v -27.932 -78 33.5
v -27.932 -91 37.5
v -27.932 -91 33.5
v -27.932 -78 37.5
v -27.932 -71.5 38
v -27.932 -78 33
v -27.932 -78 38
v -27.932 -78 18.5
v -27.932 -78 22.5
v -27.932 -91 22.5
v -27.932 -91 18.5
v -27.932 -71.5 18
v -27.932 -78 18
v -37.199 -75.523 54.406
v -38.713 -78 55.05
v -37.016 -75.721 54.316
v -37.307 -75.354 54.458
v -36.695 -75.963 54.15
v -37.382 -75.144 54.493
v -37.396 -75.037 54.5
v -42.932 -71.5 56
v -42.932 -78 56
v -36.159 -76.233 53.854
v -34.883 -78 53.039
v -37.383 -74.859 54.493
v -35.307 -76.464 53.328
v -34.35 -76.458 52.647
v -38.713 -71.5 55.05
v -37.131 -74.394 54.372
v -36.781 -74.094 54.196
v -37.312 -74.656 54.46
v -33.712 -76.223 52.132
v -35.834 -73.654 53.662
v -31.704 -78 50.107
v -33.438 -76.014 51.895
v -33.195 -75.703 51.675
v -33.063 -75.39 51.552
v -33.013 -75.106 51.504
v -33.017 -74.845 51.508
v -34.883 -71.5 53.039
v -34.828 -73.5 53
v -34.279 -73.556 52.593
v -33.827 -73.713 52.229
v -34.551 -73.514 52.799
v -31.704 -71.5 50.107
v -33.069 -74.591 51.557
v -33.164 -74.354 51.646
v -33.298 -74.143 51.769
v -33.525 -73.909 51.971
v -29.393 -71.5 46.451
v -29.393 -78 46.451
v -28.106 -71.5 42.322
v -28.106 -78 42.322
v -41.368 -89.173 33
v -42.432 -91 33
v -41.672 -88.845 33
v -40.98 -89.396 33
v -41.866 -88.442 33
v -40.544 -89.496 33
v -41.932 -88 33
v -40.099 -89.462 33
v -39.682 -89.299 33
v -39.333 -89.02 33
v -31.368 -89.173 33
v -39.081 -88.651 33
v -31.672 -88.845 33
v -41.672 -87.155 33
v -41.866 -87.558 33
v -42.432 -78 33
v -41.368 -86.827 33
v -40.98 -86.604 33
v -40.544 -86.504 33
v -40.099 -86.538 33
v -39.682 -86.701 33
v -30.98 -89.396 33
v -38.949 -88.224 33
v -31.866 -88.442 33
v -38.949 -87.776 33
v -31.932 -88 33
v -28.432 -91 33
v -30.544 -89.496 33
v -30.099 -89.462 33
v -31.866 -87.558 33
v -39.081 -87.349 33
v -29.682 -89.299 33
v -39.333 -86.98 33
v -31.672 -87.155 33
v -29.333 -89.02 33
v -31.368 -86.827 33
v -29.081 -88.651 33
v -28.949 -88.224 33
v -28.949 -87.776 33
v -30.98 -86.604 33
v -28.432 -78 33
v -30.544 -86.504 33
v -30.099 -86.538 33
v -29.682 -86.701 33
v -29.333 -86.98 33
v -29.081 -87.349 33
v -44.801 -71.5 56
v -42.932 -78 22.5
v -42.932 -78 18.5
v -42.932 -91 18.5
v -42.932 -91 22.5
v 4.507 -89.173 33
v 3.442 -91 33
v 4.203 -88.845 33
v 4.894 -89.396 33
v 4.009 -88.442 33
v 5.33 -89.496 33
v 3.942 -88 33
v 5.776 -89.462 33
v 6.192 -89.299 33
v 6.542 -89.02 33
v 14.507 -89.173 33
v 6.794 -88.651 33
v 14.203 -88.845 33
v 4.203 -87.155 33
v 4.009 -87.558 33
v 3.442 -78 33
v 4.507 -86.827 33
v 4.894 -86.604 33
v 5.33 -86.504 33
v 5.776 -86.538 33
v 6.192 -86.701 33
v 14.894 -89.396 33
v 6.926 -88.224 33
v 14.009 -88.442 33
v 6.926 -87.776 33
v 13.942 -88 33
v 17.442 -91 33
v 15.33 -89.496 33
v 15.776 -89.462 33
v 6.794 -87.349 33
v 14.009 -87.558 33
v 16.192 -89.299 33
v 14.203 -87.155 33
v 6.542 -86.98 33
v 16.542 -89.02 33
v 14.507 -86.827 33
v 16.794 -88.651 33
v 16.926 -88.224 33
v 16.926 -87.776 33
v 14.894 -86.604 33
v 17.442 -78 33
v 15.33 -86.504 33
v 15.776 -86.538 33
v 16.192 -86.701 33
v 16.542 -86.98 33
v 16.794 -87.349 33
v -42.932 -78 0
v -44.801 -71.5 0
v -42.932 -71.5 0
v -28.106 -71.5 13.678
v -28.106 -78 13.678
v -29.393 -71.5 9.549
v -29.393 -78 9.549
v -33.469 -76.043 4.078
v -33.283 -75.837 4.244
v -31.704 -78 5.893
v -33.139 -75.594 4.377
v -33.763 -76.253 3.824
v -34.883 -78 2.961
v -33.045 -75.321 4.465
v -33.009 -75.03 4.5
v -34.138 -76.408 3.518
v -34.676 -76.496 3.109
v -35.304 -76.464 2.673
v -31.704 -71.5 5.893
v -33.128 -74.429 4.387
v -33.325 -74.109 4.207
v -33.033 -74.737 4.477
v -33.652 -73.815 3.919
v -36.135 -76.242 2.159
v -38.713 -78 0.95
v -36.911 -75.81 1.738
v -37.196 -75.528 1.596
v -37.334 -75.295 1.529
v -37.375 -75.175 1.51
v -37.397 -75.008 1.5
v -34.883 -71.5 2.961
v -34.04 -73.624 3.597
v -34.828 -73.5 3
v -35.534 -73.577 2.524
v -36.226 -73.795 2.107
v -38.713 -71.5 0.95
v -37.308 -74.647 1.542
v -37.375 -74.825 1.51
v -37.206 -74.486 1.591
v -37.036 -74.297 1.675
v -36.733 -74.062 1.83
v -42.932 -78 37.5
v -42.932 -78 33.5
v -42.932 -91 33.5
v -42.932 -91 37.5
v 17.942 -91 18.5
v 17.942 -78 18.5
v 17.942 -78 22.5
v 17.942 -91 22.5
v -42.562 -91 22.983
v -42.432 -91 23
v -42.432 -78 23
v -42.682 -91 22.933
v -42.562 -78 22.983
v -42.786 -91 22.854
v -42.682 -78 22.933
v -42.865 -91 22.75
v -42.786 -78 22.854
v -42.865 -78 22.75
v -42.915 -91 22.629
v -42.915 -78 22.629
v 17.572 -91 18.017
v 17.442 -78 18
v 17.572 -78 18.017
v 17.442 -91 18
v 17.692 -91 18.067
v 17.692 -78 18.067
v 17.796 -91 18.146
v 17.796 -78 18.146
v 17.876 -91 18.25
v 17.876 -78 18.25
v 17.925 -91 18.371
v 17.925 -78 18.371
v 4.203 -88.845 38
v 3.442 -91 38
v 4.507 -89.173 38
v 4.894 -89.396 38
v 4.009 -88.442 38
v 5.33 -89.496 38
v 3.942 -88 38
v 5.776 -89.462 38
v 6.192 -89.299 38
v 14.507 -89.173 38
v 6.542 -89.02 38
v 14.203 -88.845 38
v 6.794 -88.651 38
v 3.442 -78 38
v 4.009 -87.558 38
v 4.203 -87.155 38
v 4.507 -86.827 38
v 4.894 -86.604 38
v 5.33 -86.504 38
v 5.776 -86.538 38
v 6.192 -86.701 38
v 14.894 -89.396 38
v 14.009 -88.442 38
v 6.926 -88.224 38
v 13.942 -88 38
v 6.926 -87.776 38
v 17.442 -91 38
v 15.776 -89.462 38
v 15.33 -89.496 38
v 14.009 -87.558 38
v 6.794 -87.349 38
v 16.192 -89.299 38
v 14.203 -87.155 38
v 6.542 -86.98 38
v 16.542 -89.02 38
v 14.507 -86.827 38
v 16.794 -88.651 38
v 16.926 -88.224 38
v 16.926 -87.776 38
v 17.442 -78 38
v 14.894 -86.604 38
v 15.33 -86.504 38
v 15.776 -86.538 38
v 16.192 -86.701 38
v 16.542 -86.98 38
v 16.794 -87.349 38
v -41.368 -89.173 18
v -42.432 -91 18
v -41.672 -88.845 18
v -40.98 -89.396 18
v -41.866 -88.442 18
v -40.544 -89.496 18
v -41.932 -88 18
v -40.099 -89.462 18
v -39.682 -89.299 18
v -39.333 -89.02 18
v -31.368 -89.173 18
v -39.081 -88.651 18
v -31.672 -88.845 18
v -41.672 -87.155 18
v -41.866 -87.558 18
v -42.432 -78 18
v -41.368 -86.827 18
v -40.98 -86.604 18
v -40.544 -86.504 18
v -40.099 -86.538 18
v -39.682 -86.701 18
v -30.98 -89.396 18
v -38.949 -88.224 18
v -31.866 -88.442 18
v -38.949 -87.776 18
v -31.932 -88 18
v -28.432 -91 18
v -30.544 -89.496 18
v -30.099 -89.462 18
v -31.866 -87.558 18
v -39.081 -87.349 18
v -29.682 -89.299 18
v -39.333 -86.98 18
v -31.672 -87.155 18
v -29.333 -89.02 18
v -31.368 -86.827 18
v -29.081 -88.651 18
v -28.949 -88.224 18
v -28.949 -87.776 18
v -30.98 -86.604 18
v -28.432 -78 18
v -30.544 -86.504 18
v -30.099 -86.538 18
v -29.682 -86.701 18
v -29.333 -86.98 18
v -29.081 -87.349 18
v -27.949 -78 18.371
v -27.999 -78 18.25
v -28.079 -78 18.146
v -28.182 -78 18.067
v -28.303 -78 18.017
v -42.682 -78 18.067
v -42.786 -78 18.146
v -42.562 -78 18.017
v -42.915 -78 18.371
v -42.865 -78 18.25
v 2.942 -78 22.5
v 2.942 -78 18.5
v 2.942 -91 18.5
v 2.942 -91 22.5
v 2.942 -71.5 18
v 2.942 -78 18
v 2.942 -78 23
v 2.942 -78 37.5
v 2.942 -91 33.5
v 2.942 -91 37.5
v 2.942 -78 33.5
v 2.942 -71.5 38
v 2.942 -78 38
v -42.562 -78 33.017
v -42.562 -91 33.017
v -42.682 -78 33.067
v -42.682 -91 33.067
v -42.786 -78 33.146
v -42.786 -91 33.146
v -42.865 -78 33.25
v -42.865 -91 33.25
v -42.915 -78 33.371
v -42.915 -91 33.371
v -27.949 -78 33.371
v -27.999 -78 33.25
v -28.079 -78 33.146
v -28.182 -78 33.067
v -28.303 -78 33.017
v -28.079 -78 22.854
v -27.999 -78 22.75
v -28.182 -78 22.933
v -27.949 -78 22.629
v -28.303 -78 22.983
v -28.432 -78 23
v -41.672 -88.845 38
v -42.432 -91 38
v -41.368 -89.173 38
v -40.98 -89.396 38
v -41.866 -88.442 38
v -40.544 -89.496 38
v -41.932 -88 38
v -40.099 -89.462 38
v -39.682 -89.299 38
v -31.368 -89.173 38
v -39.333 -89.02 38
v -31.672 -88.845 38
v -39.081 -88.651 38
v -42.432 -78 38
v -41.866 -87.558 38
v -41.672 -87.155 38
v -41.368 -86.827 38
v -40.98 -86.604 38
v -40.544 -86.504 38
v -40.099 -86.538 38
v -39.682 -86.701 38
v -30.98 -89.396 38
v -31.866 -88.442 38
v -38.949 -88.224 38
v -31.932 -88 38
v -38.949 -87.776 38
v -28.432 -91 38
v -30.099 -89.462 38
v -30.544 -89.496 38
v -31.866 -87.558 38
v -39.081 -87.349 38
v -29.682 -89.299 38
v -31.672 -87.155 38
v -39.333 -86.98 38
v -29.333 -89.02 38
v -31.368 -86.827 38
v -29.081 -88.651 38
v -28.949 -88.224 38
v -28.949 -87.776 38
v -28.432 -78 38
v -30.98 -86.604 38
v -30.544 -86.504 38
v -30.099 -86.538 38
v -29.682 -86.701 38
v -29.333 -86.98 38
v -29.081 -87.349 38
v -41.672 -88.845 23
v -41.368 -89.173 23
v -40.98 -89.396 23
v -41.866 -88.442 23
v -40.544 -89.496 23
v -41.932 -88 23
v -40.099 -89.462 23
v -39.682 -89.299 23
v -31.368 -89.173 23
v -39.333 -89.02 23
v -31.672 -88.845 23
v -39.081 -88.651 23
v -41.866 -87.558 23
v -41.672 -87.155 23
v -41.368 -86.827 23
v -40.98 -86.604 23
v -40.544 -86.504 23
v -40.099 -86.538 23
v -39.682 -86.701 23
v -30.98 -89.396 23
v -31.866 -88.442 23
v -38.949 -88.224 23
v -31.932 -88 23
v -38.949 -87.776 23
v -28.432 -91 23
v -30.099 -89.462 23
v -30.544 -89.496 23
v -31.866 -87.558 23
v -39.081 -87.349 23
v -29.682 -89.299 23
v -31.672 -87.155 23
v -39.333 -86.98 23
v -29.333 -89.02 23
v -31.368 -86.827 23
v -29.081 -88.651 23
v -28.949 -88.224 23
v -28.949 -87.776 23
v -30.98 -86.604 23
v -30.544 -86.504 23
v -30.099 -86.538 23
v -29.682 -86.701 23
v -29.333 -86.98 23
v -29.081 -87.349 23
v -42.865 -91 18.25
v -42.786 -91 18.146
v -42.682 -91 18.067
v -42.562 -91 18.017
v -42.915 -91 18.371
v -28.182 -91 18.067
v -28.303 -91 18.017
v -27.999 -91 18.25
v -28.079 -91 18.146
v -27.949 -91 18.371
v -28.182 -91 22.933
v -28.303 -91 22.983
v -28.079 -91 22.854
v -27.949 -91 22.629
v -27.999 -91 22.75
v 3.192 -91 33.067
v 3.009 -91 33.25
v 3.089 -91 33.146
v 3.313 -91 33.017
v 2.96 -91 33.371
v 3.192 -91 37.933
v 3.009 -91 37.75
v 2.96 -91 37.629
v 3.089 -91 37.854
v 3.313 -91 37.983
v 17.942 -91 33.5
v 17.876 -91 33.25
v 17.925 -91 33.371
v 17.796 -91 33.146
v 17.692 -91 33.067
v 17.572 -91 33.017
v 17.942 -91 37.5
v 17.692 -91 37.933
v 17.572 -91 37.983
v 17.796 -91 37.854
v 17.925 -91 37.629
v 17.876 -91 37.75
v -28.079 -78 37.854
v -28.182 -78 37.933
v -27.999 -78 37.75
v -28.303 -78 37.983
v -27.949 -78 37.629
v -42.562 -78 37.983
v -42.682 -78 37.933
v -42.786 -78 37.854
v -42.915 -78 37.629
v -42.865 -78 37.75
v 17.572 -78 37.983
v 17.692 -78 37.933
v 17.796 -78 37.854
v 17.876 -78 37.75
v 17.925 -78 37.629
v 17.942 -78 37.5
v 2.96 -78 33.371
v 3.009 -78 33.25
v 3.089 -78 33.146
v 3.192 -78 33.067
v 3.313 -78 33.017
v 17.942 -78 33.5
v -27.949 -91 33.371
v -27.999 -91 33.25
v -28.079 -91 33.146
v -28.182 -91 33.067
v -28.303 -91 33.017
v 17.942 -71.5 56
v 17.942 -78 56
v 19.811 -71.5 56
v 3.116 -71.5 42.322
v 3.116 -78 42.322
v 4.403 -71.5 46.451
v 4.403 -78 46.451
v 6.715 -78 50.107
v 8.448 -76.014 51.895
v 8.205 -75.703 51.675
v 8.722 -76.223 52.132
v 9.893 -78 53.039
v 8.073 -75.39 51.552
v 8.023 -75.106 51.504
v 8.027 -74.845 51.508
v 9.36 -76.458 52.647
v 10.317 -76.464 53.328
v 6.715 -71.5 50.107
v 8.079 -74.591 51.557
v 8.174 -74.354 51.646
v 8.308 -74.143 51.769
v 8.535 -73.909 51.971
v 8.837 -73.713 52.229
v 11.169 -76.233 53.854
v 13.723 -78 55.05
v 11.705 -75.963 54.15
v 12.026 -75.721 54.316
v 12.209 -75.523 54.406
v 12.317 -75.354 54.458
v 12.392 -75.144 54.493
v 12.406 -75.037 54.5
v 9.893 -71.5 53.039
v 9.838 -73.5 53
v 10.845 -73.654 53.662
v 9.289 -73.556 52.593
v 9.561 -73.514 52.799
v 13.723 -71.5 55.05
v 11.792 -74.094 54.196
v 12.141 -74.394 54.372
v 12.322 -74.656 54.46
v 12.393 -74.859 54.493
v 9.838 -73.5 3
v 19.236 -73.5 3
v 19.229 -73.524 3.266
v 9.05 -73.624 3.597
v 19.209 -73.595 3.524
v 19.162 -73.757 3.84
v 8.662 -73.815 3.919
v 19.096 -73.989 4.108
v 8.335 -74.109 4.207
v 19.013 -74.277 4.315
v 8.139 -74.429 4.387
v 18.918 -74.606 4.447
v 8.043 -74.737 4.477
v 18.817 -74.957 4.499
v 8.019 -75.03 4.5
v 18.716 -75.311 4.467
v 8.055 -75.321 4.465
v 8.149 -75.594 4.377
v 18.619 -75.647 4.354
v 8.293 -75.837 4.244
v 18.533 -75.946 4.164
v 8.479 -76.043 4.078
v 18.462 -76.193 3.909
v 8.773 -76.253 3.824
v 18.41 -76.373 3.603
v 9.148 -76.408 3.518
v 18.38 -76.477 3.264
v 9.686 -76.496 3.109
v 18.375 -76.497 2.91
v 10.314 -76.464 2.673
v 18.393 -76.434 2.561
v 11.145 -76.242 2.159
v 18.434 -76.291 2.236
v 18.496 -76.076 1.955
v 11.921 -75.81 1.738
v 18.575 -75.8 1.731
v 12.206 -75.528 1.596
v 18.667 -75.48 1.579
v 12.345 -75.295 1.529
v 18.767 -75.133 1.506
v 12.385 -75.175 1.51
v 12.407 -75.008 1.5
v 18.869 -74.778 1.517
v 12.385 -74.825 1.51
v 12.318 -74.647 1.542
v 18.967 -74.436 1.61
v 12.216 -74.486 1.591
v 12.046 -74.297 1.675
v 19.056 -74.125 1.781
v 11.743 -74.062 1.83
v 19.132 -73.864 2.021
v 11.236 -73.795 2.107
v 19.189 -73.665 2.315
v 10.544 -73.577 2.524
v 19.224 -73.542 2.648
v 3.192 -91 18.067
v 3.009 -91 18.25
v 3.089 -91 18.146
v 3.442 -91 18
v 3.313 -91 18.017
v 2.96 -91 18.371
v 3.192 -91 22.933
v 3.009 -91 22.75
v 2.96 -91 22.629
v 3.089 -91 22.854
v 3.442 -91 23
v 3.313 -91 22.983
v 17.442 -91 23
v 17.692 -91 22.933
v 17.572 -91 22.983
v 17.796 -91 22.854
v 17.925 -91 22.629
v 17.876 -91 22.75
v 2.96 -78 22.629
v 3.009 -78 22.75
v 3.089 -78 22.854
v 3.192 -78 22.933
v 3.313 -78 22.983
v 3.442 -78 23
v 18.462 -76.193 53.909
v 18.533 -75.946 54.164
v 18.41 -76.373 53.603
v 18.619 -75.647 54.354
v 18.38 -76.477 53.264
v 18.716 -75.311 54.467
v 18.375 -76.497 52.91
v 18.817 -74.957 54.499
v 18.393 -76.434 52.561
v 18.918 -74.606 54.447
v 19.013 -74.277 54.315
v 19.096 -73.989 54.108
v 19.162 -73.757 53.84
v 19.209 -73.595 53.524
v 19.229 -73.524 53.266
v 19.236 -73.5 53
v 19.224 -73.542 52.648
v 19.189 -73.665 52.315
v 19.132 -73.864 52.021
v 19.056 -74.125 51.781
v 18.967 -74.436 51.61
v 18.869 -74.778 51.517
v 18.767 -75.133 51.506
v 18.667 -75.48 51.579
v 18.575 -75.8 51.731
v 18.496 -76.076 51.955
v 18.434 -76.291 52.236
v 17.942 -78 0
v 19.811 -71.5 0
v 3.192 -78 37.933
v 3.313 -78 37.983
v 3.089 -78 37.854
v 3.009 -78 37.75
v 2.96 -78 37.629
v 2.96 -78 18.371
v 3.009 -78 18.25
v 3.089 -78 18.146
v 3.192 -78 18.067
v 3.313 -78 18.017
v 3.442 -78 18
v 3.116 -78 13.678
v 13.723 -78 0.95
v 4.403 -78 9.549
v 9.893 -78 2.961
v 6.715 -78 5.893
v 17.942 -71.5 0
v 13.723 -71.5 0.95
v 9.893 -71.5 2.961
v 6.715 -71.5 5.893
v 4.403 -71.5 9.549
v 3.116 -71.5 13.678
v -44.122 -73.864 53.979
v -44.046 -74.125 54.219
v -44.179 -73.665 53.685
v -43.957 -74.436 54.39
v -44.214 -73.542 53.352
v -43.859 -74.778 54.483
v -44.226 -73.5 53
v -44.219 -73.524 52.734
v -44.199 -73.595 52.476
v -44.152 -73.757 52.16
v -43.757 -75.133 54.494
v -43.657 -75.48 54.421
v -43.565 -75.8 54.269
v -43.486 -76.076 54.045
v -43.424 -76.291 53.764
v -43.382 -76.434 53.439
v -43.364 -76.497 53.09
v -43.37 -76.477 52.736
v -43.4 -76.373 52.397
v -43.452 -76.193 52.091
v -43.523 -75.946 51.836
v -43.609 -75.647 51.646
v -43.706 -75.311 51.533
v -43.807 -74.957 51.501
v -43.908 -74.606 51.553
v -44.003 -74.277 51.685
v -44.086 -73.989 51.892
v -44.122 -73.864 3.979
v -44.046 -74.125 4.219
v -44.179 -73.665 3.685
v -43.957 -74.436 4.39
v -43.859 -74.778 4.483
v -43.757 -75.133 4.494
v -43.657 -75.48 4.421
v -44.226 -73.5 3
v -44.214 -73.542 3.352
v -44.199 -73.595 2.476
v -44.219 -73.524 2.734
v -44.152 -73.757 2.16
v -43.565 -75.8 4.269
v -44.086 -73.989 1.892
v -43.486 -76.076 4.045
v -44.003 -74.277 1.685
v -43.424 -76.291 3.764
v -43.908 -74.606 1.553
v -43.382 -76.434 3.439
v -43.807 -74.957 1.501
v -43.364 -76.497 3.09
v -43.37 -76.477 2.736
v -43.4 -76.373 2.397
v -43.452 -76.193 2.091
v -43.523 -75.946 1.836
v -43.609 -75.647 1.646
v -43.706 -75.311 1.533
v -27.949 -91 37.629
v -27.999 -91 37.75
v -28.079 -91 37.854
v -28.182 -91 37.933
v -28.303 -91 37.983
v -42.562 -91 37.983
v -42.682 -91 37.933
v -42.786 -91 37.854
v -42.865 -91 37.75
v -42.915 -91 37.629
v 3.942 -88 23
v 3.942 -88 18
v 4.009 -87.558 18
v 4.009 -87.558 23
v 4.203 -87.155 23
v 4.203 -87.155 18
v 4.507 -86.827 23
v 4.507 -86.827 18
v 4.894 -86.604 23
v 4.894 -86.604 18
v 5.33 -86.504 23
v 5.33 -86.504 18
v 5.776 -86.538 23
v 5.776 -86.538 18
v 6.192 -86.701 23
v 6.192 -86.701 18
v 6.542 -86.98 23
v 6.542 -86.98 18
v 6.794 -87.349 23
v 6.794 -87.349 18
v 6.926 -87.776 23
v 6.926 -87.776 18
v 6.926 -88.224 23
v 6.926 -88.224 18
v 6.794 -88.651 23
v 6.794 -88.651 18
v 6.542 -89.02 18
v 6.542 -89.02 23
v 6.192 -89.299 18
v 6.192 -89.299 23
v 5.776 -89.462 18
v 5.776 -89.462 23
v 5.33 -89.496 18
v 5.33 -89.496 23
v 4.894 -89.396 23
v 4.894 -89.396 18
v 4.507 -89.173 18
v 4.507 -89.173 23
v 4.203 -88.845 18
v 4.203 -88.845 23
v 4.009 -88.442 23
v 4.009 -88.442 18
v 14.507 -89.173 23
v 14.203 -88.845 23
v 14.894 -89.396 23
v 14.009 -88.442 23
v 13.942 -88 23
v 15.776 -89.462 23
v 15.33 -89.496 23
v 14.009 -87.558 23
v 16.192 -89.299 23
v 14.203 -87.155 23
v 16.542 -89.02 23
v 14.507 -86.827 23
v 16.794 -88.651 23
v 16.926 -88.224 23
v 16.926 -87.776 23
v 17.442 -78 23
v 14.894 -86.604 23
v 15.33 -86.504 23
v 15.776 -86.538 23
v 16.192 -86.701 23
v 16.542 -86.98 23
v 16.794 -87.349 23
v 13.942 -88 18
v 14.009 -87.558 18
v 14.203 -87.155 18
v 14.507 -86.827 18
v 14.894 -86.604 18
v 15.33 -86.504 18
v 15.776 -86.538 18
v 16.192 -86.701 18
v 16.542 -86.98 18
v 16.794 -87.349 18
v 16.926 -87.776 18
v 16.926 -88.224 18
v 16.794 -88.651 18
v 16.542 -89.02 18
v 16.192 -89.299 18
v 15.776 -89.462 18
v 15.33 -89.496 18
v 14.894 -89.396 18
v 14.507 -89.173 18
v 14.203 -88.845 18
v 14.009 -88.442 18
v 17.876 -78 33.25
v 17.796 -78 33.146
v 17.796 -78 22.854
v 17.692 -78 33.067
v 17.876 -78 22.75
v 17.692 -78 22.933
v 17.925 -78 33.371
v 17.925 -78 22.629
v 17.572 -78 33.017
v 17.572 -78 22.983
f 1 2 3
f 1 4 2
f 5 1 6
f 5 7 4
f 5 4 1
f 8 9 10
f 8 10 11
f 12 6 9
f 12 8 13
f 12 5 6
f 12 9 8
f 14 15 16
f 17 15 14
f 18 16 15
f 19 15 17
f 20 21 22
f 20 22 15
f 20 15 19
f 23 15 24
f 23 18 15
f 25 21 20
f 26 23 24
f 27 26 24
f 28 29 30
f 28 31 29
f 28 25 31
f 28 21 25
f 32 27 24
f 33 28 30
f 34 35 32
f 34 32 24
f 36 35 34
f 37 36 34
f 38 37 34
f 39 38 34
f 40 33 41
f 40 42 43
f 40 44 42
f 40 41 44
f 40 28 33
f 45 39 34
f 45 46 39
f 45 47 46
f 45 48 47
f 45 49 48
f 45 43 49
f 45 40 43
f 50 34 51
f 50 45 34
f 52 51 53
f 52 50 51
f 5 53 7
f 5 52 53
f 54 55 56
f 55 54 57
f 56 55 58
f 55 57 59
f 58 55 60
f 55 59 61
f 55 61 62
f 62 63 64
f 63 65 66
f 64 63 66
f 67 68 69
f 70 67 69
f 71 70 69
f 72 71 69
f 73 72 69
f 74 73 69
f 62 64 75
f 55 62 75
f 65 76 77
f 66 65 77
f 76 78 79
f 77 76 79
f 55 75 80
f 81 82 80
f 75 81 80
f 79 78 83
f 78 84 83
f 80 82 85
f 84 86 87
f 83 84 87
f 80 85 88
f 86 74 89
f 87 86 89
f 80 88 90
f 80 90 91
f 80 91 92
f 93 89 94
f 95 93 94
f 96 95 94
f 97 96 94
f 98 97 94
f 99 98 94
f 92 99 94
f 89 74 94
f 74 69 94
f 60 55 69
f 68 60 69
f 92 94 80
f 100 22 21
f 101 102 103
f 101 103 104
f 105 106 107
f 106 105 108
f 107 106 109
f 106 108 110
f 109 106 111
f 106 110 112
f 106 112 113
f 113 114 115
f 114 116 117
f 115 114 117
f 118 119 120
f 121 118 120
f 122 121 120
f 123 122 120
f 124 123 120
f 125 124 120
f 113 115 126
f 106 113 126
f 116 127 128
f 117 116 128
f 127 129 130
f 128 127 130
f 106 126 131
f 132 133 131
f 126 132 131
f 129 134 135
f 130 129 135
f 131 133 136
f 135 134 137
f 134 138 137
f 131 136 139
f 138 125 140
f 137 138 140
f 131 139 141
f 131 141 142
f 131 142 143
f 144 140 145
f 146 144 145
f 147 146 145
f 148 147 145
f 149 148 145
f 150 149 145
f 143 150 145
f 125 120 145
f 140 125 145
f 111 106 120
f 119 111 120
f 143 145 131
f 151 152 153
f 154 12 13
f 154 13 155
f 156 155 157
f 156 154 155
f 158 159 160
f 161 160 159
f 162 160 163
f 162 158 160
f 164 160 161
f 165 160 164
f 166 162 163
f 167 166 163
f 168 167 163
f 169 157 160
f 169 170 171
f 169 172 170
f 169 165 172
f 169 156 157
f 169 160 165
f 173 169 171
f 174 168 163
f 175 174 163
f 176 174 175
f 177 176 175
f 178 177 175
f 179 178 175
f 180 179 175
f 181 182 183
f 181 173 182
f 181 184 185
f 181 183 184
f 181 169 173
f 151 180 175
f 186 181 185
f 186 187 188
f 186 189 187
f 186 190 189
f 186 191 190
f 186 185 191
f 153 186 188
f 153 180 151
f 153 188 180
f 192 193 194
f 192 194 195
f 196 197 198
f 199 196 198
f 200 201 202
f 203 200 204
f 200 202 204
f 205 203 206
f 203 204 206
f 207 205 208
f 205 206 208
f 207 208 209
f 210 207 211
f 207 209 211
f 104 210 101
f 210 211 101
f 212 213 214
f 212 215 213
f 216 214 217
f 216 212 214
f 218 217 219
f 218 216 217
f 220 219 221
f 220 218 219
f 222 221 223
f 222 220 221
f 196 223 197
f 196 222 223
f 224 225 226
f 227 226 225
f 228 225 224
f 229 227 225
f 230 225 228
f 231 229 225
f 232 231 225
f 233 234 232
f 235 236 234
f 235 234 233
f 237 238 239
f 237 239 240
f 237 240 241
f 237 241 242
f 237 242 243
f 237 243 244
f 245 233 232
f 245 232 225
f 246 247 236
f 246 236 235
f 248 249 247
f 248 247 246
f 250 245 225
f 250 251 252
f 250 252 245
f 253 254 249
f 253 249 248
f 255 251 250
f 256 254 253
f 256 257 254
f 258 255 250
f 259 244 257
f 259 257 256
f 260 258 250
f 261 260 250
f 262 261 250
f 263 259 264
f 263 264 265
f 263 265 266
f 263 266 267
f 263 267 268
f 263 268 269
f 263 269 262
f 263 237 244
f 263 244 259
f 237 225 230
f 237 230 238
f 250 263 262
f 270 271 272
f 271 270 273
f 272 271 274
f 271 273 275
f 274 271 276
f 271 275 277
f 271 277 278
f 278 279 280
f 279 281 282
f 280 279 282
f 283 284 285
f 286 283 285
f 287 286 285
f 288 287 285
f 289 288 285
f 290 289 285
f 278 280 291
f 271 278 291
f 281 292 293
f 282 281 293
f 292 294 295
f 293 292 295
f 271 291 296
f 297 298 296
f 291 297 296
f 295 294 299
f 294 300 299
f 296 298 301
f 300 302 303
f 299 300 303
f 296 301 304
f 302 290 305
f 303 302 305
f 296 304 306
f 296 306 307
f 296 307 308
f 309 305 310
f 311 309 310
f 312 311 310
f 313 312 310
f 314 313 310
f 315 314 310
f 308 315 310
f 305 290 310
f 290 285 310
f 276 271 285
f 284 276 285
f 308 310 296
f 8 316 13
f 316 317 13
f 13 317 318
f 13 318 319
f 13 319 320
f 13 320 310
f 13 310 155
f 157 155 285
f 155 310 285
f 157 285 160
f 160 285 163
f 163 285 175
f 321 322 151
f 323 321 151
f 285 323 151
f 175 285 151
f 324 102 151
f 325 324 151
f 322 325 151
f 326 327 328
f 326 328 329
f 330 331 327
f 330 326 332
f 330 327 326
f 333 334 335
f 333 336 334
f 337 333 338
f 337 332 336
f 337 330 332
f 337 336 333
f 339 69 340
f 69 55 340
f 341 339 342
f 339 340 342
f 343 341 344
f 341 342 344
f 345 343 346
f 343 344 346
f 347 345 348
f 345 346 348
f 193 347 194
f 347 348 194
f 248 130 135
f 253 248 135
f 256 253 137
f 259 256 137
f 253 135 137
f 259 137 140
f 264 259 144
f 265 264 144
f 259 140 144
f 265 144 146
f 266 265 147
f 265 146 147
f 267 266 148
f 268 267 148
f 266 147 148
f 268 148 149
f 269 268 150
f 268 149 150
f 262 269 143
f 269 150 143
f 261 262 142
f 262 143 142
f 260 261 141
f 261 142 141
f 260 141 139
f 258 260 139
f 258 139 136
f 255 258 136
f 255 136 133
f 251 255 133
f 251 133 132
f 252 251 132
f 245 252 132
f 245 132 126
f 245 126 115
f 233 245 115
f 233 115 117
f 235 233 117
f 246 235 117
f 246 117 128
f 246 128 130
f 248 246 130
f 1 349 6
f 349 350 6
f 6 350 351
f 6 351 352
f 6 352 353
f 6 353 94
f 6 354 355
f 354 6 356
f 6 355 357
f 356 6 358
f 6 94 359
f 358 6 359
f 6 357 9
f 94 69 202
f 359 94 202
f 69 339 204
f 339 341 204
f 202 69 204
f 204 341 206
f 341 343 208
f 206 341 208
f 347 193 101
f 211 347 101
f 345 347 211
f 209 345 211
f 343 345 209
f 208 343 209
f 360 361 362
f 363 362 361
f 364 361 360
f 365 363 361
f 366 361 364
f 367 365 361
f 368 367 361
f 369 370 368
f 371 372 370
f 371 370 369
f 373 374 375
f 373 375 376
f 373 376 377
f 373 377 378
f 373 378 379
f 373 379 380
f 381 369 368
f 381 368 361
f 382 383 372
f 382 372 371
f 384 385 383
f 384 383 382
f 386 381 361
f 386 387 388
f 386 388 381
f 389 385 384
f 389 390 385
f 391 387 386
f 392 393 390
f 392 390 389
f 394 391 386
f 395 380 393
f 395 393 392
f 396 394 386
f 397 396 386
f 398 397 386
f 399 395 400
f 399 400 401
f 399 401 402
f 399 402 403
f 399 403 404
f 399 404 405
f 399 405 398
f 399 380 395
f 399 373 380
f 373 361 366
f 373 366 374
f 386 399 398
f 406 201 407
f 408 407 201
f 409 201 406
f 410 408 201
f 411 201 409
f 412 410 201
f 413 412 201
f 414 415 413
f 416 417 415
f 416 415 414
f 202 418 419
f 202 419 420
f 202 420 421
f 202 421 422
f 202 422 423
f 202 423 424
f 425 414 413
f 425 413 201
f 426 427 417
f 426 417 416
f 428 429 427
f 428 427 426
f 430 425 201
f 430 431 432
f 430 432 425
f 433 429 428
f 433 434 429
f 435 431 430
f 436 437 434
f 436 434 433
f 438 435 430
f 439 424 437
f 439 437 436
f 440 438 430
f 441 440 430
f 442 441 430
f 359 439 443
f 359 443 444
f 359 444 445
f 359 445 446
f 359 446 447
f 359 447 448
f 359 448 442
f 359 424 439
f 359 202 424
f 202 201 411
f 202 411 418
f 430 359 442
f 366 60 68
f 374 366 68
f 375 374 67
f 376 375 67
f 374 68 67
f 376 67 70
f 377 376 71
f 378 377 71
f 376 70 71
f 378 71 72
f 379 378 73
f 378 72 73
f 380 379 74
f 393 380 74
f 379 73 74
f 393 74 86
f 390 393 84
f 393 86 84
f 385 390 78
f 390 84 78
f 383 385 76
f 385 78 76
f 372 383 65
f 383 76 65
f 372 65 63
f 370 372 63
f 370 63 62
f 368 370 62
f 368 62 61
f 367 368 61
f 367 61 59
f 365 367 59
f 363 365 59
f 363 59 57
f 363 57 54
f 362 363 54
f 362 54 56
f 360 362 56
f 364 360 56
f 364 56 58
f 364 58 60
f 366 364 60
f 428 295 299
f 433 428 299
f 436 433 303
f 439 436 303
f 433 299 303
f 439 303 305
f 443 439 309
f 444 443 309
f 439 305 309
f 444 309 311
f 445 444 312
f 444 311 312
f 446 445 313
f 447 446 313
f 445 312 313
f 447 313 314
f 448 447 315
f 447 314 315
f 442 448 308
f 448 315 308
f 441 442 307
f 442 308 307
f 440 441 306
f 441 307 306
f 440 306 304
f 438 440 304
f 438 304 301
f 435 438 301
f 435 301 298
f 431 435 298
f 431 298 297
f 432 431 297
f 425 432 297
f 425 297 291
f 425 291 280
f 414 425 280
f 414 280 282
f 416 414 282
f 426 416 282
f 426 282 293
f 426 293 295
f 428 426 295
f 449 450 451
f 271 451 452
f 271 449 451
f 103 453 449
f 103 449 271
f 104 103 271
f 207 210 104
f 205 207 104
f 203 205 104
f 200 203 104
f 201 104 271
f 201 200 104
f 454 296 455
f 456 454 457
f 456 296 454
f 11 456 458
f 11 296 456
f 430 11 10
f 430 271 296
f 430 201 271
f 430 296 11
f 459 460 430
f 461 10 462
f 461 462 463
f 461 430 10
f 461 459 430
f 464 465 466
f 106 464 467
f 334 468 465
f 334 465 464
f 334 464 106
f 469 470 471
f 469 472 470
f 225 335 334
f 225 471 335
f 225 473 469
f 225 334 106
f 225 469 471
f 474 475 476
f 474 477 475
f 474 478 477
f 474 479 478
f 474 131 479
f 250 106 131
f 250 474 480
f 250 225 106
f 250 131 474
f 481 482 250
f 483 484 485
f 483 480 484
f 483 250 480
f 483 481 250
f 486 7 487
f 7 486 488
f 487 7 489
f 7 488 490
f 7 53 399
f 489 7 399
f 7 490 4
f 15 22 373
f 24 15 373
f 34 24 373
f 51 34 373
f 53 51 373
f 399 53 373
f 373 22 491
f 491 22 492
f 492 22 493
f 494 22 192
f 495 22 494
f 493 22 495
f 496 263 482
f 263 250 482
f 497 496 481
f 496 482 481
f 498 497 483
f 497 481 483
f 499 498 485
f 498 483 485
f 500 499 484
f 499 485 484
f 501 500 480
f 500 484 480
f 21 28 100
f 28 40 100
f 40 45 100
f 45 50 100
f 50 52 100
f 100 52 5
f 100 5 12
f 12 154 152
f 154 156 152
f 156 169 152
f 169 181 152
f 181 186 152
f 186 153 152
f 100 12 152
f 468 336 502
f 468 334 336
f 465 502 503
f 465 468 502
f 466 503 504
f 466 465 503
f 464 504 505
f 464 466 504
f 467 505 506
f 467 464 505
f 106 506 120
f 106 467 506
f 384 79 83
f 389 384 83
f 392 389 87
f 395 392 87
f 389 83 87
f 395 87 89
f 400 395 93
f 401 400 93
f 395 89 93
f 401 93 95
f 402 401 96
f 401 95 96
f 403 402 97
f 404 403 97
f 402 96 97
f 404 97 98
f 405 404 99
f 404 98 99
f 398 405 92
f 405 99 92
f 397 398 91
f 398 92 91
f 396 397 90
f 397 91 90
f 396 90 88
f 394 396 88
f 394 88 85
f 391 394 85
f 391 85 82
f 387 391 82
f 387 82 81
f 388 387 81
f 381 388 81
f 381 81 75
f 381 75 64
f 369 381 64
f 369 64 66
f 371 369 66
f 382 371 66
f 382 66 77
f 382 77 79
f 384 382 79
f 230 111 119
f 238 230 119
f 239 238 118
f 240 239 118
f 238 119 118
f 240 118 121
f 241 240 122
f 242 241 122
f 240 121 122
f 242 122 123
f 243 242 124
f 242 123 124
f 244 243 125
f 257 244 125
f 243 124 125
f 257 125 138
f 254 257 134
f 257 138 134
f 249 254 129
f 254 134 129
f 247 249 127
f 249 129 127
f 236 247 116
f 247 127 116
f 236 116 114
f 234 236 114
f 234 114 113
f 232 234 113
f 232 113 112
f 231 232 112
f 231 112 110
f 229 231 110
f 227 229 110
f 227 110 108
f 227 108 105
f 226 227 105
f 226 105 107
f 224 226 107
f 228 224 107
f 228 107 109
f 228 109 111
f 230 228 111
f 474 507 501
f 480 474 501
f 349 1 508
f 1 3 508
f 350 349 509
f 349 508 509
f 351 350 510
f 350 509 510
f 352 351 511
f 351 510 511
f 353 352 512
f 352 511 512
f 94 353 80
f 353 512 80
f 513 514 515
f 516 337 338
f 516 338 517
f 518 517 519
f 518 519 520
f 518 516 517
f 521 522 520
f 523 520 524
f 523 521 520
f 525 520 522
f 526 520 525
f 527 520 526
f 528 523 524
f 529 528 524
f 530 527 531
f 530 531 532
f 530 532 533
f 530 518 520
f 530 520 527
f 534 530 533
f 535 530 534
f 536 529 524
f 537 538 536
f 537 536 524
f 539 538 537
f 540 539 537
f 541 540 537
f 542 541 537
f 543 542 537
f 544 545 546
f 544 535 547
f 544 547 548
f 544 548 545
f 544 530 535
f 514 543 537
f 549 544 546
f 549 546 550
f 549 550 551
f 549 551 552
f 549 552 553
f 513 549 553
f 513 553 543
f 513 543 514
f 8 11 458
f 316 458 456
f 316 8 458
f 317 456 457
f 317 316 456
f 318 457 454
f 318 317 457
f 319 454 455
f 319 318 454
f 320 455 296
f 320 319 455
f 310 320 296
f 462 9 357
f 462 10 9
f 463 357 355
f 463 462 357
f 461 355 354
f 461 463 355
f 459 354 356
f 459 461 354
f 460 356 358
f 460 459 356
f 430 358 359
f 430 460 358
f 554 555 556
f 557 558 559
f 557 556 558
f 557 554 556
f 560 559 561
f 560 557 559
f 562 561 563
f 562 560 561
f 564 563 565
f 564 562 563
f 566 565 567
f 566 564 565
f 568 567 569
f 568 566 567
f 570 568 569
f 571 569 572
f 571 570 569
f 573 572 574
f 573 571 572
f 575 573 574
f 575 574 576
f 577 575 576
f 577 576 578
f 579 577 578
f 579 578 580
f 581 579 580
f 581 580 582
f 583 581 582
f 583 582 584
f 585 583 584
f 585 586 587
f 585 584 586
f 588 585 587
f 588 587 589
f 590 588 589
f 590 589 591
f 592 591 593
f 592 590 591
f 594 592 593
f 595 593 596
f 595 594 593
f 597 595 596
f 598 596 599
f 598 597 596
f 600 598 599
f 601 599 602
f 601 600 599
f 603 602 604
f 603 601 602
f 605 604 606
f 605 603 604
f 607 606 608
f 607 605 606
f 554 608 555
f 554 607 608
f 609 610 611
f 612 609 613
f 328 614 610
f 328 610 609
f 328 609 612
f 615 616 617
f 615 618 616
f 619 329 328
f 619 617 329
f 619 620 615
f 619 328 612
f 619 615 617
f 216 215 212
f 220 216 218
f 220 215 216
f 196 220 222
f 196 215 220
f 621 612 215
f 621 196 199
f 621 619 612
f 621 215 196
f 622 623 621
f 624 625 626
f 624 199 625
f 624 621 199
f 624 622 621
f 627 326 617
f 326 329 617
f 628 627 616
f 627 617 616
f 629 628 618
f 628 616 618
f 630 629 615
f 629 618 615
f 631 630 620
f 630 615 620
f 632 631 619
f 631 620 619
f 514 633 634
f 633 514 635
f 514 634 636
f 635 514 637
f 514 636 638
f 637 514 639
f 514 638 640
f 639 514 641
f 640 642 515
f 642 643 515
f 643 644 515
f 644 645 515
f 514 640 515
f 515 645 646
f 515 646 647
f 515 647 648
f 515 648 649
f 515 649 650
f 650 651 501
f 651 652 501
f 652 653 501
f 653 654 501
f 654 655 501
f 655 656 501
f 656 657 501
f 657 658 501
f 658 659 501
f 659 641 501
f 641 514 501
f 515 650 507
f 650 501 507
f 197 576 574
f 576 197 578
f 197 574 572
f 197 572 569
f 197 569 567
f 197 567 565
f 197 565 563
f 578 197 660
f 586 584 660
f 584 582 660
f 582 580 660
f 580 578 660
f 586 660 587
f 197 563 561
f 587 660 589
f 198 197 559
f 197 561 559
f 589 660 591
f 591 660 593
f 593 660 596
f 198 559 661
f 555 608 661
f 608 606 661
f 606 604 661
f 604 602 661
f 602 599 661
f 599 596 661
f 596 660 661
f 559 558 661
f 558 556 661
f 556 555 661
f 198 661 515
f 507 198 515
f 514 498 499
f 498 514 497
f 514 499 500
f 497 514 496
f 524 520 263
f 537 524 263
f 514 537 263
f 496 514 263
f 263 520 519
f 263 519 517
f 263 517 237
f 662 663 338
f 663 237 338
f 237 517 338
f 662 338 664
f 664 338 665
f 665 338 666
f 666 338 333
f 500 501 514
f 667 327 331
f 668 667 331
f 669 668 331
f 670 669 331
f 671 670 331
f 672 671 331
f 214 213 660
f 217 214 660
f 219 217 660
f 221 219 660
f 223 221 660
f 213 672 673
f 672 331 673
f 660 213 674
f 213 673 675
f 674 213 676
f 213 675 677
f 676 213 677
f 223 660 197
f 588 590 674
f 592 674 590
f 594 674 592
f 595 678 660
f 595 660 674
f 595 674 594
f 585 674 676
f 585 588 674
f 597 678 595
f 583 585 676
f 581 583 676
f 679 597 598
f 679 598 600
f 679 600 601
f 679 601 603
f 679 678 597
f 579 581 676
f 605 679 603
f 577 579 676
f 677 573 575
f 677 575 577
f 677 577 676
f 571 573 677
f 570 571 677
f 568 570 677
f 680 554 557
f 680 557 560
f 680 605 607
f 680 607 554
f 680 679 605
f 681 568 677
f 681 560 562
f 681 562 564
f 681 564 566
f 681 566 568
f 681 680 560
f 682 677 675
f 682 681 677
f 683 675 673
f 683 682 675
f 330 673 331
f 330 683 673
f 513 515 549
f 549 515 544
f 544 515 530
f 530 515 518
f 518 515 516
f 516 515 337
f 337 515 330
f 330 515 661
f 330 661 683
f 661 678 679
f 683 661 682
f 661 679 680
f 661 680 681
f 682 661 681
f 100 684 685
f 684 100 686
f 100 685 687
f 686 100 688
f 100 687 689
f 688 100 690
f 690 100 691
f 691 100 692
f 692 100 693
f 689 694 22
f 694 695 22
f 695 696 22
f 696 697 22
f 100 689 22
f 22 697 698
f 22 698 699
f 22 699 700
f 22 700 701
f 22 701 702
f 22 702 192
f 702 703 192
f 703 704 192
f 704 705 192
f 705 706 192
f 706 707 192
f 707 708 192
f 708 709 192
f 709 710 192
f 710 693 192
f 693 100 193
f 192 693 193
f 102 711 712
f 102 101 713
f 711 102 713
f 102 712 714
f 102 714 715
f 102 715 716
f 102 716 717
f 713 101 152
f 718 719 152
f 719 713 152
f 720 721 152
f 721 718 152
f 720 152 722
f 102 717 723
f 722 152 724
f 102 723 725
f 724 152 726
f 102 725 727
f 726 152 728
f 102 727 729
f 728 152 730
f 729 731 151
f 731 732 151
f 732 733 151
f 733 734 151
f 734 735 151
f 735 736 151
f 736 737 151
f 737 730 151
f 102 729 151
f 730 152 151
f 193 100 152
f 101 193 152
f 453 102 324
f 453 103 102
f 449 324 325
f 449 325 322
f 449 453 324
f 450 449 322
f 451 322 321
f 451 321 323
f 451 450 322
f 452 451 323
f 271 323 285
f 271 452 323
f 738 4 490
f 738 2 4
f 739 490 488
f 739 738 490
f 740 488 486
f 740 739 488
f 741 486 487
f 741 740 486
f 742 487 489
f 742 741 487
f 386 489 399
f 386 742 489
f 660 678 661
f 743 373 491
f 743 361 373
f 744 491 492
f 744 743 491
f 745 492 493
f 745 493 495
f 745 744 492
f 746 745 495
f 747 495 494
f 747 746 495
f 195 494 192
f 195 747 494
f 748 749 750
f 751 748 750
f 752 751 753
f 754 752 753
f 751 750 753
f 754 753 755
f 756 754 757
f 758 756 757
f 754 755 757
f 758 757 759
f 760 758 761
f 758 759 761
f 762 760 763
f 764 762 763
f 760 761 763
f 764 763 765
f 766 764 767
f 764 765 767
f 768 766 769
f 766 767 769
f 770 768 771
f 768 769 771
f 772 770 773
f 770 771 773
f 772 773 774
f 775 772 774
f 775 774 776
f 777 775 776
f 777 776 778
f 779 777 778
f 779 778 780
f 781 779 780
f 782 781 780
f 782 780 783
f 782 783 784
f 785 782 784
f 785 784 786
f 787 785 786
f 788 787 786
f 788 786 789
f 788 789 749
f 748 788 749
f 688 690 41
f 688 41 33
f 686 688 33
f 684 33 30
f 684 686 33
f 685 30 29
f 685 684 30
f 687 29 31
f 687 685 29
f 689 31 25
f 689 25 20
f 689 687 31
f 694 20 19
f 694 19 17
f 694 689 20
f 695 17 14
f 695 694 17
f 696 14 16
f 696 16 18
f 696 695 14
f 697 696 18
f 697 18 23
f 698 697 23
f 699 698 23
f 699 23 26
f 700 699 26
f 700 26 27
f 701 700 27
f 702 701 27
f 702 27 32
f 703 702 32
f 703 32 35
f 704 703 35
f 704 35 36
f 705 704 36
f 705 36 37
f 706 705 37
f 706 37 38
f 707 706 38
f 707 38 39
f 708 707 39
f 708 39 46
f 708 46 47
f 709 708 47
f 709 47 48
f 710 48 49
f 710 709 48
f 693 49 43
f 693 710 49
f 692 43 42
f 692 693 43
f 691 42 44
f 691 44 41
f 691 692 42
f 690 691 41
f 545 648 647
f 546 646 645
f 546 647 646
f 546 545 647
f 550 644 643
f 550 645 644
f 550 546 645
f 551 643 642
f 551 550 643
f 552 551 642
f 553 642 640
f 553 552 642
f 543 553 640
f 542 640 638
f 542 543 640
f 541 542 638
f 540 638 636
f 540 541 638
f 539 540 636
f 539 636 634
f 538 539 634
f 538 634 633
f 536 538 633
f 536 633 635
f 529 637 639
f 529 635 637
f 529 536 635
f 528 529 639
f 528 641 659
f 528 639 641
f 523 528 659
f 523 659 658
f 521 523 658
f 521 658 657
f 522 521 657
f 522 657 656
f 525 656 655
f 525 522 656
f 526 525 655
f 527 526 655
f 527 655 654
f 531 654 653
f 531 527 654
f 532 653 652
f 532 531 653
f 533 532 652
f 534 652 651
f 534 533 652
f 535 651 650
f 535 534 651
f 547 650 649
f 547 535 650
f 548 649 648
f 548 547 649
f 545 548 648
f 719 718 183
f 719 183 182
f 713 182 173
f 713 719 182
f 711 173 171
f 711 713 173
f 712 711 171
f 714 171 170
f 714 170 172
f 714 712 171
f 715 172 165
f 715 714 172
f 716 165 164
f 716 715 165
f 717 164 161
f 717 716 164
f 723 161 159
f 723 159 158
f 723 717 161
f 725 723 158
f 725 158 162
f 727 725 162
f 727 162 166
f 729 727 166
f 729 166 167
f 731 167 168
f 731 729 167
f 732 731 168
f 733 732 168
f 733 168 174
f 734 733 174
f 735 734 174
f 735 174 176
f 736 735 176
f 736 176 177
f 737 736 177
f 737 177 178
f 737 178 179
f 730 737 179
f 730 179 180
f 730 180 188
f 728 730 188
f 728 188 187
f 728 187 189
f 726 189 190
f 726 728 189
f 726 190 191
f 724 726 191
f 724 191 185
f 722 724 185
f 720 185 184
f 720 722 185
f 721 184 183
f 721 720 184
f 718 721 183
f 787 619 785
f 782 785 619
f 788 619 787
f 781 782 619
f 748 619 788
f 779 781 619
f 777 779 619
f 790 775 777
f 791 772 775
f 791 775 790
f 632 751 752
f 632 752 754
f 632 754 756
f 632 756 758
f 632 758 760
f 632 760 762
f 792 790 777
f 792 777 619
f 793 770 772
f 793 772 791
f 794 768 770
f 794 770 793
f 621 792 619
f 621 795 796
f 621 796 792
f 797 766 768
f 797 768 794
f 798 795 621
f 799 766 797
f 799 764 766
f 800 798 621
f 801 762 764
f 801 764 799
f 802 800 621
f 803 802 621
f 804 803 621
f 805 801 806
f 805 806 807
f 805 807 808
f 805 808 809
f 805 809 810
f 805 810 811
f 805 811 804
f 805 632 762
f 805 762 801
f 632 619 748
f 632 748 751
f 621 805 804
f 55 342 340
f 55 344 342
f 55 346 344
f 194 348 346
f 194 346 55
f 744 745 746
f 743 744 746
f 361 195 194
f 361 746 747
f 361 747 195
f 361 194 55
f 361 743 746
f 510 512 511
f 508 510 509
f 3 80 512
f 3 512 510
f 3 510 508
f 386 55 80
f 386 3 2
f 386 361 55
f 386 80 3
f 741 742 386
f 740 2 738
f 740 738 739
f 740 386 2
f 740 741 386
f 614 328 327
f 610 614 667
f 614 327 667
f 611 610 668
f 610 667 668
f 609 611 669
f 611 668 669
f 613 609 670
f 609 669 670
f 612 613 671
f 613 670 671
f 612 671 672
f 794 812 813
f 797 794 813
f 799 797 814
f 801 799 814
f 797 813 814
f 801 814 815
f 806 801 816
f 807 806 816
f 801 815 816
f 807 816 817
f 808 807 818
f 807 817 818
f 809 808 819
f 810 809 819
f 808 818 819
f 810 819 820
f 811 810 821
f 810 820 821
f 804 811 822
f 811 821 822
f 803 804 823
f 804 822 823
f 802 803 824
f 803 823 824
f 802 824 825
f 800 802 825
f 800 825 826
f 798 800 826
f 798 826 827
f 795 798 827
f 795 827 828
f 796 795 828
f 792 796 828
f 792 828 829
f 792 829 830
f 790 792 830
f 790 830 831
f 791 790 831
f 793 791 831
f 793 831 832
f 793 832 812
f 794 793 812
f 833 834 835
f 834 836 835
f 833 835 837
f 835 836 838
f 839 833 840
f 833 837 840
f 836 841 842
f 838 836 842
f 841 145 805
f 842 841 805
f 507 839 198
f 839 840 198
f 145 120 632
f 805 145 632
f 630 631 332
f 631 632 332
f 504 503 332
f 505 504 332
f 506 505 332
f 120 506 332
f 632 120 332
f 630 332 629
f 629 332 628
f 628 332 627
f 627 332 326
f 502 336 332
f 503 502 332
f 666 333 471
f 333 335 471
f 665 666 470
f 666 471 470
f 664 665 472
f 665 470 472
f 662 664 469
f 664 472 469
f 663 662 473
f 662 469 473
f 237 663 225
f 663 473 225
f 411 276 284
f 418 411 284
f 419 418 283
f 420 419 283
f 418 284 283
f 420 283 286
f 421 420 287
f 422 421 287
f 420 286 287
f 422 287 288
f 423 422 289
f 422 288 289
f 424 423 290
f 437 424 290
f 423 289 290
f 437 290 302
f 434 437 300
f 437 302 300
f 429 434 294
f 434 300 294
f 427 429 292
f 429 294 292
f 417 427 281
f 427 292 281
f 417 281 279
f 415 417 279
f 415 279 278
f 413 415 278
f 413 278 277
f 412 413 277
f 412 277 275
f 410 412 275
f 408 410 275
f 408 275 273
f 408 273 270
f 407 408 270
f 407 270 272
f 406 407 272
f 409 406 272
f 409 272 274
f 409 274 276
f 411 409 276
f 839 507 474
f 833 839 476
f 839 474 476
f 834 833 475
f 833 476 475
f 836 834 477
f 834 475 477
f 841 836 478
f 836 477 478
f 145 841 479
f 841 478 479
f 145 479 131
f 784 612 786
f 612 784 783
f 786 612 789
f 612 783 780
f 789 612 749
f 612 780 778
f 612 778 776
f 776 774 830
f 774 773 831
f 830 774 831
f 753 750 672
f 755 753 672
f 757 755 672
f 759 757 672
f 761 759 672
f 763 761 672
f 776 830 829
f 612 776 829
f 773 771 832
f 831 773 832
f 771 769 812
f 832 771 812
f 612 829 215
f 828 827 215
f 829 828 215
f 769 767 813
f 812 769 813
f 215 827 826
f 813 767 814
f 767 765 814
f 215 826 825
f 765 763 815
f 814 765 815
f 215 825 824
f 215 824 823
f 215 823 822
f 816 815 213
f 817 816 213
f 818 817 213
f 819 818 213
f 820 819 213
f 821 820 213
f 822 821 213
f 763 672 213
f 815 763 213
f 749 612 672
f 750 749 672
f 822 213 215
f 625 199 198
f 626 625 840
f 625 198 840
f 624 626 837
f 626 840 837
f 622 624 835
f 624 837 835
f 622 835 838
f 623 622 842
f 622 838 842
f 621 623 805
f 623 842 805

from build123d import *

# Parameters (mm, degrees)
BOSS_EXTRUDE1_DEPTH     = 62
CUT_EXTRUDE1_DEPTH      = 62
CUT_EXTRUDE1_DEPTH_BACK = 62
SKETCH2_R               = 1.5
CUT_EXTRUDE2_DEPTH      = 62
CUT_EXTRUDE2_DEPTH_BACK = 62
SKETCH3_W               = 8.022178305
SKETCH3_H               = 21.045195033
CUT_EXTRUDE3_DEPTH      = 62
CUT_EXTRUDE3_DEPTH_BACK = 62
SKETCH4_W               = 61.260270692
SKETCH4_H               = 6.493024082
SKETCH5_W               = 24.437419654
SKETCH5_H               = 5
BOSS_EXTRUDE2_DEPTH     = 13
SKETCH7_R               = 1.5
SKETCH7_W               = 30.874839308
SKETCH7_H               = 16.235122229
CUT_EXTRUDE4_DEPTH      = 23
CUT_EXTRUDE5_DEPTH      = 20
CUT_EXTRUDE5_DEPTH_BACK = 21
FILLET1_R               = 0.5
FILLET2_R               = 0.5
FILLET3_R               = 0.5
FILLET4_R               = 0.5
FILLET5_R               = 0.5
FILLET6_R               = 0.5
FILLET7_R               = 0.5
FILLET8_R               = 0.5
FILLET9_R               = 0.5
FILLET10_R              = 0.5
FILLET11_R              = 0.5
FILLET12_R              = 0.5
FILLET13_R              = 0.5
FILLET14_R              = 0.5
FILLET15_R              = 0.5
FILLET16_R              = 0.5


with BuildPart() as part:
    # Sketch1 → Boss-Extrude1 (new body)
    with BuildSketch(Plane.XY):
        Polygon((-42.357341369, -80), (17.367493653, -80), (19.811252759, -71.5), (-44.801100475, -71.5), align=None)
    extrude(amount=BOSS_EXTRUDE1_DEPTH)

    # Sketch2 → Cut-Extrude1 (cut, two sides: drawn at the far end of the back side and taken through both)
    with BuildSketch(Plane(origin=(0, 0, 0), x_dir=(0, 0, -1), z_dir=(1, 0, 0)).offset(-CUT_EXTRUDE1_DEPTH_BACK)):
        with Locations(Location((-53, -75, 0), (0, 0, 90))):
            Circle(SKETCH2_R)
        with Locations(Location((-3, -75, 0), (0, 0, 90))):
            Circle(SKETCH2_R)
    extrude(amount=CUT_EXTRUDE1_DEPTH + CUT_EXTRUDE1_DEPTH_BACK, mode=Mode.SUBTRACT)

    # Sketch3 → Cut-Extrude2 (cut, two sides: drawn at the far end of the back side and taken through both)
    with BuildSketch(Plane(origin=(0, 0, 0), x_dir=(0, 0, -1), z_dir=(1, 0, 0)).offset(-CUT_EXTRUDE2_DEPTH_BACK)):
        with Locations((-60.011089152, -76.583473071)):
            Rectangle(SKETCH3_W, SKETCH3_H)
    extrude(amount=CUT_EXTRUDE2_DEPTH + CUT_EXTRUDE2_DEPTH_BACK, mode=Mode.SUBTRACT)

    # Sketch4 → Cut-Extrude3 (cut, two sides: drawn at the far end of the back side and taken through both)
    with BuildSketch(Plane(origin=(0, 0, 0), x_dir=(0, 0, -1), z_dir=(1, 0, 0)).offset(-CUT_EXTRUDE3_DEPTH_BACK)):
        with Locations((-28, -81.246512041)):
            Rectangle(SKETCH4_W, SKETCH4_H)
    extrude(amount=CUT_EXTRUDE3_DEPTH + CUT_EXTRUDE3_DEPTH_BACK, mode=Mode.SUBTRACT)

    # Sketch5 → Boss-Extrude2 (add)
    with BuildSketch(Plane.XZ.offset(78)):
        with Locations((-30.713633685, 35.5)):
            Rectangle(SKETCH5_W, SKETCH5_H)
        with Locations((5.723785969, 35.5)):
            Rectangle(SKETCH5_W, SKETCH5_H)
        with Locations((-30.713633685, 20.5)):
            Rectangle(SKETCH5_W, SKETCH5_H)
        with Locations((5.723785969, 20.5)):
            Rectangle(SKETCH5_W, SKETCH5_H)
    extrude(amount=BOSS_EXTRUDE2_DEPTH)

    # Sketch7 → Cut-Extrude4 (cut)
    with BuildSketch(Plane(origin=(0, 0, 18), x_dir=(-1, 0, 0), z_dir=(0, 0, -1))):
        with Locations((-15.442495796, -88)):
            Circle(SKETCH7_R)
        with Locations((-5.442495796, -88)):
            Circle(SKETCH7_R)
        with Locations((30.432343512, -88)):
            Circle(SKETCH7_R)
        with Locations((40.432343512, -88)):
            Circle(SKETCH7_R)
        with Locations((12.494923858, -86.117561115)):
            Rectangle(SKETCH7_W, SKETCH7_H)
    extrude(amount=-CUT_EXTRUDE4_DEPTH, mode=Mode.SUBTRACT)

    # Sketch8 → Cut-Extrude5 (cut, two sides: drawn at the far end of the back side and taken through both)
    with BuildSketch(Plane.XZ.offset(78).offset(-CUT_EXTRUDE5_DEPTH_BACK)):
        with BuildLine():
            ThreePointArc((-42.932343512, 56), (-31.70442145, 50.106601718), (-27.932343512, 38))
            Line((-27.932343512, 38), (-27.932343512, 33))
            Line((-27.932343512, 33), (-27.932343512, 23))
            Line((-27.932343512, 23), (-27.932343512, 18))
            ThreePointArc((-27.932343512, 18), (-31.70442145, 5.893398282), (-42.932343512, 0))
            Line((-42.932343512, 0), (17.942495796, 0))
            ThreePointArc((17.942495796, 0), (6.714573734, 5.893398282), (2.942495796, 18))
            Line((2.942495796, 18), (2.942495796, 23))
            Line((2.942495796, 23), (2.942495796, 33))
            Line((2.942495796, 33), (2.942495796, 38))
            ThreePointArc((2.942495796, 38), (6.714573734, 50.106601718), (17.942495796, 56))
            Line((17.942495796, 56), (-42.932343512, 56))
        make_face()
    extrude(amount=CUT_EXTRUDE5_DEPTH + CUT_EXTRUDE5_DEPTH_BACK, mode=Mode.SUBTRACT)


with BuildPart() as cut_extrude5_piece_1:
    # of the separate pieces the step leaves, piece 1, a body of its own (cut_extrude5_pieces)
    add(part.part.solids().sort_by_distance((17.942495796, -71.5, 0))[0])

    # Fillet1
    fillet1_edges = [cut_extrude5_piece_1.edges().sort_by_distance(p)[0] for p in [
        (17.942495796, -84.5, 33),
    ]]
    fillet(fillet1_edges, radius=FILLET1_R)

    # Fillet2
    fillet2_edges = [cut_extrude5_piece_1.edges().sort_by_distance(p)[0] for p in [
        (17.942495796, -84.5, 38),
    ]]
    fillet(fillet2_edges, radius=FILLET2_R)

    # Fillet3
    # the kernel refuses this fillet: 0.5 mm, written as the material it takes off along each edge
    with BuildSketch(Plane(origin=(17.942495796, -78, 23), x_dir=(-1, 0, 0), z_dir=(0, -1, 0))) as fillet3_piece_1_section:
        with BuildLine():
            CenterArc((FILLET3_R, FILLET3_R), FILLET3_R, 180, 90)
            Line((0, FILLET3_R), (0, 0))
            Line((0, 0), (FILLET3_R, 0))
        make_face()
    fillet3_piece_1 = extrude(amount=14.25, mode=Mode.PRIVATE)
    fillet3_piece_1 = split(fillet3_piece_1, bisect_by=Plane(origin=(17.826756801, -78.402568918, 22.946763744), z_dir=(-0.9610690305242926, 0.2763083758540381, 0)), keep=Keep.TOP, mode=Mode.PRIVATE)
    add(fillet3_piece_1, mode=Mode.SUBTRACT)
    with BuildSketch(Plane(origin=(17.942495796, -78, 23), x_dir=(-1, 0, 0), z_dir=(0, -1, 0))) as fillet3_piece_2_section:
        with BuildLine():
            CenterArc((FILLET3_R, FILLET3_R), FILLET3_R, 180, 90)
            Line((0, FILLET3_R), (0, 0))
            Line((0, 0), (FILLET3_R, 0))
        make_face()
    fillet3_piece_2 = extrude(amount=14.25, mode=Mode.PRIVATE)
    fillet3_piece_2 = split(fillet3_piece_2, bisect_by=Plane(origin=(15.990895382, -84.788150058, 22.885092436), z_dir=(0.9610690305242926, -0.2763083758540381, 0)), keep=Keep.TOP, mode=Mode.PRIVATE)
    add(fillet3_piece_2, mode=Mode.SUBTRACT)

    # Fillet4
    fillet4_edges = [cut_extrude5_piece_1.edges().sort_by_distance(p)[0] for p in [
        (17.942495796, -84.5, 18),
    ]]
    fillet(fillet4_edges, radius=FILLET4_R)

    # Fillet5
    fillet5_edges = [cut_extrude5_piece_1.edges().sort_by_distance(p)[0] for p in [
        (2.942495796, -84.5, 18),
    ]]
    fillet(fillet5_edges, radius=FILLET5_R)

    # Fillet6
    fillet6_edges = [cut_extrude5_piece_1.edges().sort_by_distance(p)[0] for p in [
        (2.942495796, -84.5, 33),
    ]]
    fillet(fillet6_edges, radius=FILLET6_R)

    # Fillet7
    fillet7_edges = [cut_extrude5_piece_1.edges().sort_by_distance(p)[0] for p in [
        (2.942495796, -84.5, 23),
    ]]
    fillet(fillet7_edges, radius=FILLET7_R)

    # Fillet8
    fillet8_edges = [cut_extrude5_piece_1.edges().sort_by_distance(p)[0] for p in [
        (2.942495796, -84.5, 38),
    ]]
    fillet(fillet8_edges, radius=FILLET8_R)


with BuildPart() as cut_extrude5_piece_2:
    # of the separate pieces the step leaves, piece 2, a body of its own (cut_extrude5_pieces)
    add(part.part.solids().sort_by_distance((-42.932343512, -71.5, 0))[0])

    # Fillet9
    fillet9_edges = [cut_extrude5_piece_2.edges().sort_by_distance(p)[0] for p in [
        (-42.932343512, -84.5, 18),
    ]]
    fillet(fillet9_edges, radius=FILLET9_R)

    # Fillet10
    fillet10_edges = [cut_extrude5_piece_2.edges().sort_by_distance(p)[0] for p in [
        (-27.932343512, -84.5, 18),
    ]]
    fillet(fillet10_edges, radius=FILLET10_R)

    # Fillet11
    fillet11_edges = [cut_extrude5_piece_2.edges().sort_by_distance(p)[0] for p in [
        (-27.932343512, -84.5, 23),
    ]]
    fillet(fillet11_edges, radius=FILLET11_R)

    # Fillet12
    fillet12_edges = [cut_extrude5_piece_2.edges().sort_by_distance(p)[0] for p in [
        (-27.932343512, -84.5, 33),
    ]]
    fillet(fillet12_edges, radius=FILLET12_R)

    # Fillet13
    fillet13_edges = [cut_extrude5_piece_2.edges().sort_by_distance(p)[0] for p in [
        (-27.932343512, -84.5, 38),
    ]]
    fillet(fillet13_edges, radius=FILLET13_R)

    # Fillet14
    fillet14_edges = [cut_extrude5_piece_2.edges().sort_by_distance(p)[0] for p in [
        (-42.932343512, -84.5, 38),
    ]]
    fillet(fillet14_edges, radius=FILLET14_R)

    # Fillet15
    fillet15_edges = [cut_extrude5_piece_2.edges().sort_by_distance(p)[0] for p in [
        (-42.932343512, -84.5, 33),
    ]]
    fillet(fillet15_edges, radius=FILLET15_R)

    # Fillet16
    # the kernel refuses this fillet: 0.5 mm, written as the material it takes off along each edge
    with BuildSketch(Plane(origin=(-42.932343512, -78, 23), x_dir=(0, 0, -1), z_dir=(0, -1, 0))) as fillet16_piece_1_section:
        with BuildLine():
            CenterArc((FILLET16_R, FILLET16_R), FILLET16_R, 180, 90)
            Line((0, FILLET16_R), (0, 0))
            Line((0, 0), (FILLET16_R, 0))
        make_face()
    fillet16_piece_1 = extrude(amount=14.25, mode=Mode.PRIVATE)
    fillet16_piece_1 = split(fillet16_piece_1, bisect_by=Plane(origin=(-42.816604516, -78.402568918, 22.946763744), z_dir=(0.9610690305242929, 0.2763083758540371, 0)), keep=Keep.TOP, mode=Mode.PRIVATE)
    add(fillet16_piece_1, mode=Mode.SUBTRACT)
    with BuildSketch(Plane(origin=(-42.932343512, -78, 23), x_dir=(0, 0, -1), z_dir=(0, -1, 0))) as fillet16_piece_2_section:
        with BuildLine():
            CenterArc((FILLET16_R, FILLET16_R), FILLET16_R, 180, 90)
            Line((0, FILLET16_R), (0, 0))
            Line((0, 0), (FILLET16_R, 0))
        make_face()
    fillet16_piece_2 = extrude(amount=14.25, mode=Mode.PRIVATE)
    fillet16_piece_2 = split(fillet16_piece_2, bisect_by=Plane(origin=(-40.980743098, -84.788150058, 22.885092436), z_dir=(-0.9610690305242929, -0.2763083758540371, 0)), keep=Keep.TOP, mode=Mode.PRIVATE)
    add(fillet16_piece_2, mode=Mode.SUBTRACT)


solid = Compound([cut_extrude5_piece_1.part, cut_extrude5_piece_2.part])
